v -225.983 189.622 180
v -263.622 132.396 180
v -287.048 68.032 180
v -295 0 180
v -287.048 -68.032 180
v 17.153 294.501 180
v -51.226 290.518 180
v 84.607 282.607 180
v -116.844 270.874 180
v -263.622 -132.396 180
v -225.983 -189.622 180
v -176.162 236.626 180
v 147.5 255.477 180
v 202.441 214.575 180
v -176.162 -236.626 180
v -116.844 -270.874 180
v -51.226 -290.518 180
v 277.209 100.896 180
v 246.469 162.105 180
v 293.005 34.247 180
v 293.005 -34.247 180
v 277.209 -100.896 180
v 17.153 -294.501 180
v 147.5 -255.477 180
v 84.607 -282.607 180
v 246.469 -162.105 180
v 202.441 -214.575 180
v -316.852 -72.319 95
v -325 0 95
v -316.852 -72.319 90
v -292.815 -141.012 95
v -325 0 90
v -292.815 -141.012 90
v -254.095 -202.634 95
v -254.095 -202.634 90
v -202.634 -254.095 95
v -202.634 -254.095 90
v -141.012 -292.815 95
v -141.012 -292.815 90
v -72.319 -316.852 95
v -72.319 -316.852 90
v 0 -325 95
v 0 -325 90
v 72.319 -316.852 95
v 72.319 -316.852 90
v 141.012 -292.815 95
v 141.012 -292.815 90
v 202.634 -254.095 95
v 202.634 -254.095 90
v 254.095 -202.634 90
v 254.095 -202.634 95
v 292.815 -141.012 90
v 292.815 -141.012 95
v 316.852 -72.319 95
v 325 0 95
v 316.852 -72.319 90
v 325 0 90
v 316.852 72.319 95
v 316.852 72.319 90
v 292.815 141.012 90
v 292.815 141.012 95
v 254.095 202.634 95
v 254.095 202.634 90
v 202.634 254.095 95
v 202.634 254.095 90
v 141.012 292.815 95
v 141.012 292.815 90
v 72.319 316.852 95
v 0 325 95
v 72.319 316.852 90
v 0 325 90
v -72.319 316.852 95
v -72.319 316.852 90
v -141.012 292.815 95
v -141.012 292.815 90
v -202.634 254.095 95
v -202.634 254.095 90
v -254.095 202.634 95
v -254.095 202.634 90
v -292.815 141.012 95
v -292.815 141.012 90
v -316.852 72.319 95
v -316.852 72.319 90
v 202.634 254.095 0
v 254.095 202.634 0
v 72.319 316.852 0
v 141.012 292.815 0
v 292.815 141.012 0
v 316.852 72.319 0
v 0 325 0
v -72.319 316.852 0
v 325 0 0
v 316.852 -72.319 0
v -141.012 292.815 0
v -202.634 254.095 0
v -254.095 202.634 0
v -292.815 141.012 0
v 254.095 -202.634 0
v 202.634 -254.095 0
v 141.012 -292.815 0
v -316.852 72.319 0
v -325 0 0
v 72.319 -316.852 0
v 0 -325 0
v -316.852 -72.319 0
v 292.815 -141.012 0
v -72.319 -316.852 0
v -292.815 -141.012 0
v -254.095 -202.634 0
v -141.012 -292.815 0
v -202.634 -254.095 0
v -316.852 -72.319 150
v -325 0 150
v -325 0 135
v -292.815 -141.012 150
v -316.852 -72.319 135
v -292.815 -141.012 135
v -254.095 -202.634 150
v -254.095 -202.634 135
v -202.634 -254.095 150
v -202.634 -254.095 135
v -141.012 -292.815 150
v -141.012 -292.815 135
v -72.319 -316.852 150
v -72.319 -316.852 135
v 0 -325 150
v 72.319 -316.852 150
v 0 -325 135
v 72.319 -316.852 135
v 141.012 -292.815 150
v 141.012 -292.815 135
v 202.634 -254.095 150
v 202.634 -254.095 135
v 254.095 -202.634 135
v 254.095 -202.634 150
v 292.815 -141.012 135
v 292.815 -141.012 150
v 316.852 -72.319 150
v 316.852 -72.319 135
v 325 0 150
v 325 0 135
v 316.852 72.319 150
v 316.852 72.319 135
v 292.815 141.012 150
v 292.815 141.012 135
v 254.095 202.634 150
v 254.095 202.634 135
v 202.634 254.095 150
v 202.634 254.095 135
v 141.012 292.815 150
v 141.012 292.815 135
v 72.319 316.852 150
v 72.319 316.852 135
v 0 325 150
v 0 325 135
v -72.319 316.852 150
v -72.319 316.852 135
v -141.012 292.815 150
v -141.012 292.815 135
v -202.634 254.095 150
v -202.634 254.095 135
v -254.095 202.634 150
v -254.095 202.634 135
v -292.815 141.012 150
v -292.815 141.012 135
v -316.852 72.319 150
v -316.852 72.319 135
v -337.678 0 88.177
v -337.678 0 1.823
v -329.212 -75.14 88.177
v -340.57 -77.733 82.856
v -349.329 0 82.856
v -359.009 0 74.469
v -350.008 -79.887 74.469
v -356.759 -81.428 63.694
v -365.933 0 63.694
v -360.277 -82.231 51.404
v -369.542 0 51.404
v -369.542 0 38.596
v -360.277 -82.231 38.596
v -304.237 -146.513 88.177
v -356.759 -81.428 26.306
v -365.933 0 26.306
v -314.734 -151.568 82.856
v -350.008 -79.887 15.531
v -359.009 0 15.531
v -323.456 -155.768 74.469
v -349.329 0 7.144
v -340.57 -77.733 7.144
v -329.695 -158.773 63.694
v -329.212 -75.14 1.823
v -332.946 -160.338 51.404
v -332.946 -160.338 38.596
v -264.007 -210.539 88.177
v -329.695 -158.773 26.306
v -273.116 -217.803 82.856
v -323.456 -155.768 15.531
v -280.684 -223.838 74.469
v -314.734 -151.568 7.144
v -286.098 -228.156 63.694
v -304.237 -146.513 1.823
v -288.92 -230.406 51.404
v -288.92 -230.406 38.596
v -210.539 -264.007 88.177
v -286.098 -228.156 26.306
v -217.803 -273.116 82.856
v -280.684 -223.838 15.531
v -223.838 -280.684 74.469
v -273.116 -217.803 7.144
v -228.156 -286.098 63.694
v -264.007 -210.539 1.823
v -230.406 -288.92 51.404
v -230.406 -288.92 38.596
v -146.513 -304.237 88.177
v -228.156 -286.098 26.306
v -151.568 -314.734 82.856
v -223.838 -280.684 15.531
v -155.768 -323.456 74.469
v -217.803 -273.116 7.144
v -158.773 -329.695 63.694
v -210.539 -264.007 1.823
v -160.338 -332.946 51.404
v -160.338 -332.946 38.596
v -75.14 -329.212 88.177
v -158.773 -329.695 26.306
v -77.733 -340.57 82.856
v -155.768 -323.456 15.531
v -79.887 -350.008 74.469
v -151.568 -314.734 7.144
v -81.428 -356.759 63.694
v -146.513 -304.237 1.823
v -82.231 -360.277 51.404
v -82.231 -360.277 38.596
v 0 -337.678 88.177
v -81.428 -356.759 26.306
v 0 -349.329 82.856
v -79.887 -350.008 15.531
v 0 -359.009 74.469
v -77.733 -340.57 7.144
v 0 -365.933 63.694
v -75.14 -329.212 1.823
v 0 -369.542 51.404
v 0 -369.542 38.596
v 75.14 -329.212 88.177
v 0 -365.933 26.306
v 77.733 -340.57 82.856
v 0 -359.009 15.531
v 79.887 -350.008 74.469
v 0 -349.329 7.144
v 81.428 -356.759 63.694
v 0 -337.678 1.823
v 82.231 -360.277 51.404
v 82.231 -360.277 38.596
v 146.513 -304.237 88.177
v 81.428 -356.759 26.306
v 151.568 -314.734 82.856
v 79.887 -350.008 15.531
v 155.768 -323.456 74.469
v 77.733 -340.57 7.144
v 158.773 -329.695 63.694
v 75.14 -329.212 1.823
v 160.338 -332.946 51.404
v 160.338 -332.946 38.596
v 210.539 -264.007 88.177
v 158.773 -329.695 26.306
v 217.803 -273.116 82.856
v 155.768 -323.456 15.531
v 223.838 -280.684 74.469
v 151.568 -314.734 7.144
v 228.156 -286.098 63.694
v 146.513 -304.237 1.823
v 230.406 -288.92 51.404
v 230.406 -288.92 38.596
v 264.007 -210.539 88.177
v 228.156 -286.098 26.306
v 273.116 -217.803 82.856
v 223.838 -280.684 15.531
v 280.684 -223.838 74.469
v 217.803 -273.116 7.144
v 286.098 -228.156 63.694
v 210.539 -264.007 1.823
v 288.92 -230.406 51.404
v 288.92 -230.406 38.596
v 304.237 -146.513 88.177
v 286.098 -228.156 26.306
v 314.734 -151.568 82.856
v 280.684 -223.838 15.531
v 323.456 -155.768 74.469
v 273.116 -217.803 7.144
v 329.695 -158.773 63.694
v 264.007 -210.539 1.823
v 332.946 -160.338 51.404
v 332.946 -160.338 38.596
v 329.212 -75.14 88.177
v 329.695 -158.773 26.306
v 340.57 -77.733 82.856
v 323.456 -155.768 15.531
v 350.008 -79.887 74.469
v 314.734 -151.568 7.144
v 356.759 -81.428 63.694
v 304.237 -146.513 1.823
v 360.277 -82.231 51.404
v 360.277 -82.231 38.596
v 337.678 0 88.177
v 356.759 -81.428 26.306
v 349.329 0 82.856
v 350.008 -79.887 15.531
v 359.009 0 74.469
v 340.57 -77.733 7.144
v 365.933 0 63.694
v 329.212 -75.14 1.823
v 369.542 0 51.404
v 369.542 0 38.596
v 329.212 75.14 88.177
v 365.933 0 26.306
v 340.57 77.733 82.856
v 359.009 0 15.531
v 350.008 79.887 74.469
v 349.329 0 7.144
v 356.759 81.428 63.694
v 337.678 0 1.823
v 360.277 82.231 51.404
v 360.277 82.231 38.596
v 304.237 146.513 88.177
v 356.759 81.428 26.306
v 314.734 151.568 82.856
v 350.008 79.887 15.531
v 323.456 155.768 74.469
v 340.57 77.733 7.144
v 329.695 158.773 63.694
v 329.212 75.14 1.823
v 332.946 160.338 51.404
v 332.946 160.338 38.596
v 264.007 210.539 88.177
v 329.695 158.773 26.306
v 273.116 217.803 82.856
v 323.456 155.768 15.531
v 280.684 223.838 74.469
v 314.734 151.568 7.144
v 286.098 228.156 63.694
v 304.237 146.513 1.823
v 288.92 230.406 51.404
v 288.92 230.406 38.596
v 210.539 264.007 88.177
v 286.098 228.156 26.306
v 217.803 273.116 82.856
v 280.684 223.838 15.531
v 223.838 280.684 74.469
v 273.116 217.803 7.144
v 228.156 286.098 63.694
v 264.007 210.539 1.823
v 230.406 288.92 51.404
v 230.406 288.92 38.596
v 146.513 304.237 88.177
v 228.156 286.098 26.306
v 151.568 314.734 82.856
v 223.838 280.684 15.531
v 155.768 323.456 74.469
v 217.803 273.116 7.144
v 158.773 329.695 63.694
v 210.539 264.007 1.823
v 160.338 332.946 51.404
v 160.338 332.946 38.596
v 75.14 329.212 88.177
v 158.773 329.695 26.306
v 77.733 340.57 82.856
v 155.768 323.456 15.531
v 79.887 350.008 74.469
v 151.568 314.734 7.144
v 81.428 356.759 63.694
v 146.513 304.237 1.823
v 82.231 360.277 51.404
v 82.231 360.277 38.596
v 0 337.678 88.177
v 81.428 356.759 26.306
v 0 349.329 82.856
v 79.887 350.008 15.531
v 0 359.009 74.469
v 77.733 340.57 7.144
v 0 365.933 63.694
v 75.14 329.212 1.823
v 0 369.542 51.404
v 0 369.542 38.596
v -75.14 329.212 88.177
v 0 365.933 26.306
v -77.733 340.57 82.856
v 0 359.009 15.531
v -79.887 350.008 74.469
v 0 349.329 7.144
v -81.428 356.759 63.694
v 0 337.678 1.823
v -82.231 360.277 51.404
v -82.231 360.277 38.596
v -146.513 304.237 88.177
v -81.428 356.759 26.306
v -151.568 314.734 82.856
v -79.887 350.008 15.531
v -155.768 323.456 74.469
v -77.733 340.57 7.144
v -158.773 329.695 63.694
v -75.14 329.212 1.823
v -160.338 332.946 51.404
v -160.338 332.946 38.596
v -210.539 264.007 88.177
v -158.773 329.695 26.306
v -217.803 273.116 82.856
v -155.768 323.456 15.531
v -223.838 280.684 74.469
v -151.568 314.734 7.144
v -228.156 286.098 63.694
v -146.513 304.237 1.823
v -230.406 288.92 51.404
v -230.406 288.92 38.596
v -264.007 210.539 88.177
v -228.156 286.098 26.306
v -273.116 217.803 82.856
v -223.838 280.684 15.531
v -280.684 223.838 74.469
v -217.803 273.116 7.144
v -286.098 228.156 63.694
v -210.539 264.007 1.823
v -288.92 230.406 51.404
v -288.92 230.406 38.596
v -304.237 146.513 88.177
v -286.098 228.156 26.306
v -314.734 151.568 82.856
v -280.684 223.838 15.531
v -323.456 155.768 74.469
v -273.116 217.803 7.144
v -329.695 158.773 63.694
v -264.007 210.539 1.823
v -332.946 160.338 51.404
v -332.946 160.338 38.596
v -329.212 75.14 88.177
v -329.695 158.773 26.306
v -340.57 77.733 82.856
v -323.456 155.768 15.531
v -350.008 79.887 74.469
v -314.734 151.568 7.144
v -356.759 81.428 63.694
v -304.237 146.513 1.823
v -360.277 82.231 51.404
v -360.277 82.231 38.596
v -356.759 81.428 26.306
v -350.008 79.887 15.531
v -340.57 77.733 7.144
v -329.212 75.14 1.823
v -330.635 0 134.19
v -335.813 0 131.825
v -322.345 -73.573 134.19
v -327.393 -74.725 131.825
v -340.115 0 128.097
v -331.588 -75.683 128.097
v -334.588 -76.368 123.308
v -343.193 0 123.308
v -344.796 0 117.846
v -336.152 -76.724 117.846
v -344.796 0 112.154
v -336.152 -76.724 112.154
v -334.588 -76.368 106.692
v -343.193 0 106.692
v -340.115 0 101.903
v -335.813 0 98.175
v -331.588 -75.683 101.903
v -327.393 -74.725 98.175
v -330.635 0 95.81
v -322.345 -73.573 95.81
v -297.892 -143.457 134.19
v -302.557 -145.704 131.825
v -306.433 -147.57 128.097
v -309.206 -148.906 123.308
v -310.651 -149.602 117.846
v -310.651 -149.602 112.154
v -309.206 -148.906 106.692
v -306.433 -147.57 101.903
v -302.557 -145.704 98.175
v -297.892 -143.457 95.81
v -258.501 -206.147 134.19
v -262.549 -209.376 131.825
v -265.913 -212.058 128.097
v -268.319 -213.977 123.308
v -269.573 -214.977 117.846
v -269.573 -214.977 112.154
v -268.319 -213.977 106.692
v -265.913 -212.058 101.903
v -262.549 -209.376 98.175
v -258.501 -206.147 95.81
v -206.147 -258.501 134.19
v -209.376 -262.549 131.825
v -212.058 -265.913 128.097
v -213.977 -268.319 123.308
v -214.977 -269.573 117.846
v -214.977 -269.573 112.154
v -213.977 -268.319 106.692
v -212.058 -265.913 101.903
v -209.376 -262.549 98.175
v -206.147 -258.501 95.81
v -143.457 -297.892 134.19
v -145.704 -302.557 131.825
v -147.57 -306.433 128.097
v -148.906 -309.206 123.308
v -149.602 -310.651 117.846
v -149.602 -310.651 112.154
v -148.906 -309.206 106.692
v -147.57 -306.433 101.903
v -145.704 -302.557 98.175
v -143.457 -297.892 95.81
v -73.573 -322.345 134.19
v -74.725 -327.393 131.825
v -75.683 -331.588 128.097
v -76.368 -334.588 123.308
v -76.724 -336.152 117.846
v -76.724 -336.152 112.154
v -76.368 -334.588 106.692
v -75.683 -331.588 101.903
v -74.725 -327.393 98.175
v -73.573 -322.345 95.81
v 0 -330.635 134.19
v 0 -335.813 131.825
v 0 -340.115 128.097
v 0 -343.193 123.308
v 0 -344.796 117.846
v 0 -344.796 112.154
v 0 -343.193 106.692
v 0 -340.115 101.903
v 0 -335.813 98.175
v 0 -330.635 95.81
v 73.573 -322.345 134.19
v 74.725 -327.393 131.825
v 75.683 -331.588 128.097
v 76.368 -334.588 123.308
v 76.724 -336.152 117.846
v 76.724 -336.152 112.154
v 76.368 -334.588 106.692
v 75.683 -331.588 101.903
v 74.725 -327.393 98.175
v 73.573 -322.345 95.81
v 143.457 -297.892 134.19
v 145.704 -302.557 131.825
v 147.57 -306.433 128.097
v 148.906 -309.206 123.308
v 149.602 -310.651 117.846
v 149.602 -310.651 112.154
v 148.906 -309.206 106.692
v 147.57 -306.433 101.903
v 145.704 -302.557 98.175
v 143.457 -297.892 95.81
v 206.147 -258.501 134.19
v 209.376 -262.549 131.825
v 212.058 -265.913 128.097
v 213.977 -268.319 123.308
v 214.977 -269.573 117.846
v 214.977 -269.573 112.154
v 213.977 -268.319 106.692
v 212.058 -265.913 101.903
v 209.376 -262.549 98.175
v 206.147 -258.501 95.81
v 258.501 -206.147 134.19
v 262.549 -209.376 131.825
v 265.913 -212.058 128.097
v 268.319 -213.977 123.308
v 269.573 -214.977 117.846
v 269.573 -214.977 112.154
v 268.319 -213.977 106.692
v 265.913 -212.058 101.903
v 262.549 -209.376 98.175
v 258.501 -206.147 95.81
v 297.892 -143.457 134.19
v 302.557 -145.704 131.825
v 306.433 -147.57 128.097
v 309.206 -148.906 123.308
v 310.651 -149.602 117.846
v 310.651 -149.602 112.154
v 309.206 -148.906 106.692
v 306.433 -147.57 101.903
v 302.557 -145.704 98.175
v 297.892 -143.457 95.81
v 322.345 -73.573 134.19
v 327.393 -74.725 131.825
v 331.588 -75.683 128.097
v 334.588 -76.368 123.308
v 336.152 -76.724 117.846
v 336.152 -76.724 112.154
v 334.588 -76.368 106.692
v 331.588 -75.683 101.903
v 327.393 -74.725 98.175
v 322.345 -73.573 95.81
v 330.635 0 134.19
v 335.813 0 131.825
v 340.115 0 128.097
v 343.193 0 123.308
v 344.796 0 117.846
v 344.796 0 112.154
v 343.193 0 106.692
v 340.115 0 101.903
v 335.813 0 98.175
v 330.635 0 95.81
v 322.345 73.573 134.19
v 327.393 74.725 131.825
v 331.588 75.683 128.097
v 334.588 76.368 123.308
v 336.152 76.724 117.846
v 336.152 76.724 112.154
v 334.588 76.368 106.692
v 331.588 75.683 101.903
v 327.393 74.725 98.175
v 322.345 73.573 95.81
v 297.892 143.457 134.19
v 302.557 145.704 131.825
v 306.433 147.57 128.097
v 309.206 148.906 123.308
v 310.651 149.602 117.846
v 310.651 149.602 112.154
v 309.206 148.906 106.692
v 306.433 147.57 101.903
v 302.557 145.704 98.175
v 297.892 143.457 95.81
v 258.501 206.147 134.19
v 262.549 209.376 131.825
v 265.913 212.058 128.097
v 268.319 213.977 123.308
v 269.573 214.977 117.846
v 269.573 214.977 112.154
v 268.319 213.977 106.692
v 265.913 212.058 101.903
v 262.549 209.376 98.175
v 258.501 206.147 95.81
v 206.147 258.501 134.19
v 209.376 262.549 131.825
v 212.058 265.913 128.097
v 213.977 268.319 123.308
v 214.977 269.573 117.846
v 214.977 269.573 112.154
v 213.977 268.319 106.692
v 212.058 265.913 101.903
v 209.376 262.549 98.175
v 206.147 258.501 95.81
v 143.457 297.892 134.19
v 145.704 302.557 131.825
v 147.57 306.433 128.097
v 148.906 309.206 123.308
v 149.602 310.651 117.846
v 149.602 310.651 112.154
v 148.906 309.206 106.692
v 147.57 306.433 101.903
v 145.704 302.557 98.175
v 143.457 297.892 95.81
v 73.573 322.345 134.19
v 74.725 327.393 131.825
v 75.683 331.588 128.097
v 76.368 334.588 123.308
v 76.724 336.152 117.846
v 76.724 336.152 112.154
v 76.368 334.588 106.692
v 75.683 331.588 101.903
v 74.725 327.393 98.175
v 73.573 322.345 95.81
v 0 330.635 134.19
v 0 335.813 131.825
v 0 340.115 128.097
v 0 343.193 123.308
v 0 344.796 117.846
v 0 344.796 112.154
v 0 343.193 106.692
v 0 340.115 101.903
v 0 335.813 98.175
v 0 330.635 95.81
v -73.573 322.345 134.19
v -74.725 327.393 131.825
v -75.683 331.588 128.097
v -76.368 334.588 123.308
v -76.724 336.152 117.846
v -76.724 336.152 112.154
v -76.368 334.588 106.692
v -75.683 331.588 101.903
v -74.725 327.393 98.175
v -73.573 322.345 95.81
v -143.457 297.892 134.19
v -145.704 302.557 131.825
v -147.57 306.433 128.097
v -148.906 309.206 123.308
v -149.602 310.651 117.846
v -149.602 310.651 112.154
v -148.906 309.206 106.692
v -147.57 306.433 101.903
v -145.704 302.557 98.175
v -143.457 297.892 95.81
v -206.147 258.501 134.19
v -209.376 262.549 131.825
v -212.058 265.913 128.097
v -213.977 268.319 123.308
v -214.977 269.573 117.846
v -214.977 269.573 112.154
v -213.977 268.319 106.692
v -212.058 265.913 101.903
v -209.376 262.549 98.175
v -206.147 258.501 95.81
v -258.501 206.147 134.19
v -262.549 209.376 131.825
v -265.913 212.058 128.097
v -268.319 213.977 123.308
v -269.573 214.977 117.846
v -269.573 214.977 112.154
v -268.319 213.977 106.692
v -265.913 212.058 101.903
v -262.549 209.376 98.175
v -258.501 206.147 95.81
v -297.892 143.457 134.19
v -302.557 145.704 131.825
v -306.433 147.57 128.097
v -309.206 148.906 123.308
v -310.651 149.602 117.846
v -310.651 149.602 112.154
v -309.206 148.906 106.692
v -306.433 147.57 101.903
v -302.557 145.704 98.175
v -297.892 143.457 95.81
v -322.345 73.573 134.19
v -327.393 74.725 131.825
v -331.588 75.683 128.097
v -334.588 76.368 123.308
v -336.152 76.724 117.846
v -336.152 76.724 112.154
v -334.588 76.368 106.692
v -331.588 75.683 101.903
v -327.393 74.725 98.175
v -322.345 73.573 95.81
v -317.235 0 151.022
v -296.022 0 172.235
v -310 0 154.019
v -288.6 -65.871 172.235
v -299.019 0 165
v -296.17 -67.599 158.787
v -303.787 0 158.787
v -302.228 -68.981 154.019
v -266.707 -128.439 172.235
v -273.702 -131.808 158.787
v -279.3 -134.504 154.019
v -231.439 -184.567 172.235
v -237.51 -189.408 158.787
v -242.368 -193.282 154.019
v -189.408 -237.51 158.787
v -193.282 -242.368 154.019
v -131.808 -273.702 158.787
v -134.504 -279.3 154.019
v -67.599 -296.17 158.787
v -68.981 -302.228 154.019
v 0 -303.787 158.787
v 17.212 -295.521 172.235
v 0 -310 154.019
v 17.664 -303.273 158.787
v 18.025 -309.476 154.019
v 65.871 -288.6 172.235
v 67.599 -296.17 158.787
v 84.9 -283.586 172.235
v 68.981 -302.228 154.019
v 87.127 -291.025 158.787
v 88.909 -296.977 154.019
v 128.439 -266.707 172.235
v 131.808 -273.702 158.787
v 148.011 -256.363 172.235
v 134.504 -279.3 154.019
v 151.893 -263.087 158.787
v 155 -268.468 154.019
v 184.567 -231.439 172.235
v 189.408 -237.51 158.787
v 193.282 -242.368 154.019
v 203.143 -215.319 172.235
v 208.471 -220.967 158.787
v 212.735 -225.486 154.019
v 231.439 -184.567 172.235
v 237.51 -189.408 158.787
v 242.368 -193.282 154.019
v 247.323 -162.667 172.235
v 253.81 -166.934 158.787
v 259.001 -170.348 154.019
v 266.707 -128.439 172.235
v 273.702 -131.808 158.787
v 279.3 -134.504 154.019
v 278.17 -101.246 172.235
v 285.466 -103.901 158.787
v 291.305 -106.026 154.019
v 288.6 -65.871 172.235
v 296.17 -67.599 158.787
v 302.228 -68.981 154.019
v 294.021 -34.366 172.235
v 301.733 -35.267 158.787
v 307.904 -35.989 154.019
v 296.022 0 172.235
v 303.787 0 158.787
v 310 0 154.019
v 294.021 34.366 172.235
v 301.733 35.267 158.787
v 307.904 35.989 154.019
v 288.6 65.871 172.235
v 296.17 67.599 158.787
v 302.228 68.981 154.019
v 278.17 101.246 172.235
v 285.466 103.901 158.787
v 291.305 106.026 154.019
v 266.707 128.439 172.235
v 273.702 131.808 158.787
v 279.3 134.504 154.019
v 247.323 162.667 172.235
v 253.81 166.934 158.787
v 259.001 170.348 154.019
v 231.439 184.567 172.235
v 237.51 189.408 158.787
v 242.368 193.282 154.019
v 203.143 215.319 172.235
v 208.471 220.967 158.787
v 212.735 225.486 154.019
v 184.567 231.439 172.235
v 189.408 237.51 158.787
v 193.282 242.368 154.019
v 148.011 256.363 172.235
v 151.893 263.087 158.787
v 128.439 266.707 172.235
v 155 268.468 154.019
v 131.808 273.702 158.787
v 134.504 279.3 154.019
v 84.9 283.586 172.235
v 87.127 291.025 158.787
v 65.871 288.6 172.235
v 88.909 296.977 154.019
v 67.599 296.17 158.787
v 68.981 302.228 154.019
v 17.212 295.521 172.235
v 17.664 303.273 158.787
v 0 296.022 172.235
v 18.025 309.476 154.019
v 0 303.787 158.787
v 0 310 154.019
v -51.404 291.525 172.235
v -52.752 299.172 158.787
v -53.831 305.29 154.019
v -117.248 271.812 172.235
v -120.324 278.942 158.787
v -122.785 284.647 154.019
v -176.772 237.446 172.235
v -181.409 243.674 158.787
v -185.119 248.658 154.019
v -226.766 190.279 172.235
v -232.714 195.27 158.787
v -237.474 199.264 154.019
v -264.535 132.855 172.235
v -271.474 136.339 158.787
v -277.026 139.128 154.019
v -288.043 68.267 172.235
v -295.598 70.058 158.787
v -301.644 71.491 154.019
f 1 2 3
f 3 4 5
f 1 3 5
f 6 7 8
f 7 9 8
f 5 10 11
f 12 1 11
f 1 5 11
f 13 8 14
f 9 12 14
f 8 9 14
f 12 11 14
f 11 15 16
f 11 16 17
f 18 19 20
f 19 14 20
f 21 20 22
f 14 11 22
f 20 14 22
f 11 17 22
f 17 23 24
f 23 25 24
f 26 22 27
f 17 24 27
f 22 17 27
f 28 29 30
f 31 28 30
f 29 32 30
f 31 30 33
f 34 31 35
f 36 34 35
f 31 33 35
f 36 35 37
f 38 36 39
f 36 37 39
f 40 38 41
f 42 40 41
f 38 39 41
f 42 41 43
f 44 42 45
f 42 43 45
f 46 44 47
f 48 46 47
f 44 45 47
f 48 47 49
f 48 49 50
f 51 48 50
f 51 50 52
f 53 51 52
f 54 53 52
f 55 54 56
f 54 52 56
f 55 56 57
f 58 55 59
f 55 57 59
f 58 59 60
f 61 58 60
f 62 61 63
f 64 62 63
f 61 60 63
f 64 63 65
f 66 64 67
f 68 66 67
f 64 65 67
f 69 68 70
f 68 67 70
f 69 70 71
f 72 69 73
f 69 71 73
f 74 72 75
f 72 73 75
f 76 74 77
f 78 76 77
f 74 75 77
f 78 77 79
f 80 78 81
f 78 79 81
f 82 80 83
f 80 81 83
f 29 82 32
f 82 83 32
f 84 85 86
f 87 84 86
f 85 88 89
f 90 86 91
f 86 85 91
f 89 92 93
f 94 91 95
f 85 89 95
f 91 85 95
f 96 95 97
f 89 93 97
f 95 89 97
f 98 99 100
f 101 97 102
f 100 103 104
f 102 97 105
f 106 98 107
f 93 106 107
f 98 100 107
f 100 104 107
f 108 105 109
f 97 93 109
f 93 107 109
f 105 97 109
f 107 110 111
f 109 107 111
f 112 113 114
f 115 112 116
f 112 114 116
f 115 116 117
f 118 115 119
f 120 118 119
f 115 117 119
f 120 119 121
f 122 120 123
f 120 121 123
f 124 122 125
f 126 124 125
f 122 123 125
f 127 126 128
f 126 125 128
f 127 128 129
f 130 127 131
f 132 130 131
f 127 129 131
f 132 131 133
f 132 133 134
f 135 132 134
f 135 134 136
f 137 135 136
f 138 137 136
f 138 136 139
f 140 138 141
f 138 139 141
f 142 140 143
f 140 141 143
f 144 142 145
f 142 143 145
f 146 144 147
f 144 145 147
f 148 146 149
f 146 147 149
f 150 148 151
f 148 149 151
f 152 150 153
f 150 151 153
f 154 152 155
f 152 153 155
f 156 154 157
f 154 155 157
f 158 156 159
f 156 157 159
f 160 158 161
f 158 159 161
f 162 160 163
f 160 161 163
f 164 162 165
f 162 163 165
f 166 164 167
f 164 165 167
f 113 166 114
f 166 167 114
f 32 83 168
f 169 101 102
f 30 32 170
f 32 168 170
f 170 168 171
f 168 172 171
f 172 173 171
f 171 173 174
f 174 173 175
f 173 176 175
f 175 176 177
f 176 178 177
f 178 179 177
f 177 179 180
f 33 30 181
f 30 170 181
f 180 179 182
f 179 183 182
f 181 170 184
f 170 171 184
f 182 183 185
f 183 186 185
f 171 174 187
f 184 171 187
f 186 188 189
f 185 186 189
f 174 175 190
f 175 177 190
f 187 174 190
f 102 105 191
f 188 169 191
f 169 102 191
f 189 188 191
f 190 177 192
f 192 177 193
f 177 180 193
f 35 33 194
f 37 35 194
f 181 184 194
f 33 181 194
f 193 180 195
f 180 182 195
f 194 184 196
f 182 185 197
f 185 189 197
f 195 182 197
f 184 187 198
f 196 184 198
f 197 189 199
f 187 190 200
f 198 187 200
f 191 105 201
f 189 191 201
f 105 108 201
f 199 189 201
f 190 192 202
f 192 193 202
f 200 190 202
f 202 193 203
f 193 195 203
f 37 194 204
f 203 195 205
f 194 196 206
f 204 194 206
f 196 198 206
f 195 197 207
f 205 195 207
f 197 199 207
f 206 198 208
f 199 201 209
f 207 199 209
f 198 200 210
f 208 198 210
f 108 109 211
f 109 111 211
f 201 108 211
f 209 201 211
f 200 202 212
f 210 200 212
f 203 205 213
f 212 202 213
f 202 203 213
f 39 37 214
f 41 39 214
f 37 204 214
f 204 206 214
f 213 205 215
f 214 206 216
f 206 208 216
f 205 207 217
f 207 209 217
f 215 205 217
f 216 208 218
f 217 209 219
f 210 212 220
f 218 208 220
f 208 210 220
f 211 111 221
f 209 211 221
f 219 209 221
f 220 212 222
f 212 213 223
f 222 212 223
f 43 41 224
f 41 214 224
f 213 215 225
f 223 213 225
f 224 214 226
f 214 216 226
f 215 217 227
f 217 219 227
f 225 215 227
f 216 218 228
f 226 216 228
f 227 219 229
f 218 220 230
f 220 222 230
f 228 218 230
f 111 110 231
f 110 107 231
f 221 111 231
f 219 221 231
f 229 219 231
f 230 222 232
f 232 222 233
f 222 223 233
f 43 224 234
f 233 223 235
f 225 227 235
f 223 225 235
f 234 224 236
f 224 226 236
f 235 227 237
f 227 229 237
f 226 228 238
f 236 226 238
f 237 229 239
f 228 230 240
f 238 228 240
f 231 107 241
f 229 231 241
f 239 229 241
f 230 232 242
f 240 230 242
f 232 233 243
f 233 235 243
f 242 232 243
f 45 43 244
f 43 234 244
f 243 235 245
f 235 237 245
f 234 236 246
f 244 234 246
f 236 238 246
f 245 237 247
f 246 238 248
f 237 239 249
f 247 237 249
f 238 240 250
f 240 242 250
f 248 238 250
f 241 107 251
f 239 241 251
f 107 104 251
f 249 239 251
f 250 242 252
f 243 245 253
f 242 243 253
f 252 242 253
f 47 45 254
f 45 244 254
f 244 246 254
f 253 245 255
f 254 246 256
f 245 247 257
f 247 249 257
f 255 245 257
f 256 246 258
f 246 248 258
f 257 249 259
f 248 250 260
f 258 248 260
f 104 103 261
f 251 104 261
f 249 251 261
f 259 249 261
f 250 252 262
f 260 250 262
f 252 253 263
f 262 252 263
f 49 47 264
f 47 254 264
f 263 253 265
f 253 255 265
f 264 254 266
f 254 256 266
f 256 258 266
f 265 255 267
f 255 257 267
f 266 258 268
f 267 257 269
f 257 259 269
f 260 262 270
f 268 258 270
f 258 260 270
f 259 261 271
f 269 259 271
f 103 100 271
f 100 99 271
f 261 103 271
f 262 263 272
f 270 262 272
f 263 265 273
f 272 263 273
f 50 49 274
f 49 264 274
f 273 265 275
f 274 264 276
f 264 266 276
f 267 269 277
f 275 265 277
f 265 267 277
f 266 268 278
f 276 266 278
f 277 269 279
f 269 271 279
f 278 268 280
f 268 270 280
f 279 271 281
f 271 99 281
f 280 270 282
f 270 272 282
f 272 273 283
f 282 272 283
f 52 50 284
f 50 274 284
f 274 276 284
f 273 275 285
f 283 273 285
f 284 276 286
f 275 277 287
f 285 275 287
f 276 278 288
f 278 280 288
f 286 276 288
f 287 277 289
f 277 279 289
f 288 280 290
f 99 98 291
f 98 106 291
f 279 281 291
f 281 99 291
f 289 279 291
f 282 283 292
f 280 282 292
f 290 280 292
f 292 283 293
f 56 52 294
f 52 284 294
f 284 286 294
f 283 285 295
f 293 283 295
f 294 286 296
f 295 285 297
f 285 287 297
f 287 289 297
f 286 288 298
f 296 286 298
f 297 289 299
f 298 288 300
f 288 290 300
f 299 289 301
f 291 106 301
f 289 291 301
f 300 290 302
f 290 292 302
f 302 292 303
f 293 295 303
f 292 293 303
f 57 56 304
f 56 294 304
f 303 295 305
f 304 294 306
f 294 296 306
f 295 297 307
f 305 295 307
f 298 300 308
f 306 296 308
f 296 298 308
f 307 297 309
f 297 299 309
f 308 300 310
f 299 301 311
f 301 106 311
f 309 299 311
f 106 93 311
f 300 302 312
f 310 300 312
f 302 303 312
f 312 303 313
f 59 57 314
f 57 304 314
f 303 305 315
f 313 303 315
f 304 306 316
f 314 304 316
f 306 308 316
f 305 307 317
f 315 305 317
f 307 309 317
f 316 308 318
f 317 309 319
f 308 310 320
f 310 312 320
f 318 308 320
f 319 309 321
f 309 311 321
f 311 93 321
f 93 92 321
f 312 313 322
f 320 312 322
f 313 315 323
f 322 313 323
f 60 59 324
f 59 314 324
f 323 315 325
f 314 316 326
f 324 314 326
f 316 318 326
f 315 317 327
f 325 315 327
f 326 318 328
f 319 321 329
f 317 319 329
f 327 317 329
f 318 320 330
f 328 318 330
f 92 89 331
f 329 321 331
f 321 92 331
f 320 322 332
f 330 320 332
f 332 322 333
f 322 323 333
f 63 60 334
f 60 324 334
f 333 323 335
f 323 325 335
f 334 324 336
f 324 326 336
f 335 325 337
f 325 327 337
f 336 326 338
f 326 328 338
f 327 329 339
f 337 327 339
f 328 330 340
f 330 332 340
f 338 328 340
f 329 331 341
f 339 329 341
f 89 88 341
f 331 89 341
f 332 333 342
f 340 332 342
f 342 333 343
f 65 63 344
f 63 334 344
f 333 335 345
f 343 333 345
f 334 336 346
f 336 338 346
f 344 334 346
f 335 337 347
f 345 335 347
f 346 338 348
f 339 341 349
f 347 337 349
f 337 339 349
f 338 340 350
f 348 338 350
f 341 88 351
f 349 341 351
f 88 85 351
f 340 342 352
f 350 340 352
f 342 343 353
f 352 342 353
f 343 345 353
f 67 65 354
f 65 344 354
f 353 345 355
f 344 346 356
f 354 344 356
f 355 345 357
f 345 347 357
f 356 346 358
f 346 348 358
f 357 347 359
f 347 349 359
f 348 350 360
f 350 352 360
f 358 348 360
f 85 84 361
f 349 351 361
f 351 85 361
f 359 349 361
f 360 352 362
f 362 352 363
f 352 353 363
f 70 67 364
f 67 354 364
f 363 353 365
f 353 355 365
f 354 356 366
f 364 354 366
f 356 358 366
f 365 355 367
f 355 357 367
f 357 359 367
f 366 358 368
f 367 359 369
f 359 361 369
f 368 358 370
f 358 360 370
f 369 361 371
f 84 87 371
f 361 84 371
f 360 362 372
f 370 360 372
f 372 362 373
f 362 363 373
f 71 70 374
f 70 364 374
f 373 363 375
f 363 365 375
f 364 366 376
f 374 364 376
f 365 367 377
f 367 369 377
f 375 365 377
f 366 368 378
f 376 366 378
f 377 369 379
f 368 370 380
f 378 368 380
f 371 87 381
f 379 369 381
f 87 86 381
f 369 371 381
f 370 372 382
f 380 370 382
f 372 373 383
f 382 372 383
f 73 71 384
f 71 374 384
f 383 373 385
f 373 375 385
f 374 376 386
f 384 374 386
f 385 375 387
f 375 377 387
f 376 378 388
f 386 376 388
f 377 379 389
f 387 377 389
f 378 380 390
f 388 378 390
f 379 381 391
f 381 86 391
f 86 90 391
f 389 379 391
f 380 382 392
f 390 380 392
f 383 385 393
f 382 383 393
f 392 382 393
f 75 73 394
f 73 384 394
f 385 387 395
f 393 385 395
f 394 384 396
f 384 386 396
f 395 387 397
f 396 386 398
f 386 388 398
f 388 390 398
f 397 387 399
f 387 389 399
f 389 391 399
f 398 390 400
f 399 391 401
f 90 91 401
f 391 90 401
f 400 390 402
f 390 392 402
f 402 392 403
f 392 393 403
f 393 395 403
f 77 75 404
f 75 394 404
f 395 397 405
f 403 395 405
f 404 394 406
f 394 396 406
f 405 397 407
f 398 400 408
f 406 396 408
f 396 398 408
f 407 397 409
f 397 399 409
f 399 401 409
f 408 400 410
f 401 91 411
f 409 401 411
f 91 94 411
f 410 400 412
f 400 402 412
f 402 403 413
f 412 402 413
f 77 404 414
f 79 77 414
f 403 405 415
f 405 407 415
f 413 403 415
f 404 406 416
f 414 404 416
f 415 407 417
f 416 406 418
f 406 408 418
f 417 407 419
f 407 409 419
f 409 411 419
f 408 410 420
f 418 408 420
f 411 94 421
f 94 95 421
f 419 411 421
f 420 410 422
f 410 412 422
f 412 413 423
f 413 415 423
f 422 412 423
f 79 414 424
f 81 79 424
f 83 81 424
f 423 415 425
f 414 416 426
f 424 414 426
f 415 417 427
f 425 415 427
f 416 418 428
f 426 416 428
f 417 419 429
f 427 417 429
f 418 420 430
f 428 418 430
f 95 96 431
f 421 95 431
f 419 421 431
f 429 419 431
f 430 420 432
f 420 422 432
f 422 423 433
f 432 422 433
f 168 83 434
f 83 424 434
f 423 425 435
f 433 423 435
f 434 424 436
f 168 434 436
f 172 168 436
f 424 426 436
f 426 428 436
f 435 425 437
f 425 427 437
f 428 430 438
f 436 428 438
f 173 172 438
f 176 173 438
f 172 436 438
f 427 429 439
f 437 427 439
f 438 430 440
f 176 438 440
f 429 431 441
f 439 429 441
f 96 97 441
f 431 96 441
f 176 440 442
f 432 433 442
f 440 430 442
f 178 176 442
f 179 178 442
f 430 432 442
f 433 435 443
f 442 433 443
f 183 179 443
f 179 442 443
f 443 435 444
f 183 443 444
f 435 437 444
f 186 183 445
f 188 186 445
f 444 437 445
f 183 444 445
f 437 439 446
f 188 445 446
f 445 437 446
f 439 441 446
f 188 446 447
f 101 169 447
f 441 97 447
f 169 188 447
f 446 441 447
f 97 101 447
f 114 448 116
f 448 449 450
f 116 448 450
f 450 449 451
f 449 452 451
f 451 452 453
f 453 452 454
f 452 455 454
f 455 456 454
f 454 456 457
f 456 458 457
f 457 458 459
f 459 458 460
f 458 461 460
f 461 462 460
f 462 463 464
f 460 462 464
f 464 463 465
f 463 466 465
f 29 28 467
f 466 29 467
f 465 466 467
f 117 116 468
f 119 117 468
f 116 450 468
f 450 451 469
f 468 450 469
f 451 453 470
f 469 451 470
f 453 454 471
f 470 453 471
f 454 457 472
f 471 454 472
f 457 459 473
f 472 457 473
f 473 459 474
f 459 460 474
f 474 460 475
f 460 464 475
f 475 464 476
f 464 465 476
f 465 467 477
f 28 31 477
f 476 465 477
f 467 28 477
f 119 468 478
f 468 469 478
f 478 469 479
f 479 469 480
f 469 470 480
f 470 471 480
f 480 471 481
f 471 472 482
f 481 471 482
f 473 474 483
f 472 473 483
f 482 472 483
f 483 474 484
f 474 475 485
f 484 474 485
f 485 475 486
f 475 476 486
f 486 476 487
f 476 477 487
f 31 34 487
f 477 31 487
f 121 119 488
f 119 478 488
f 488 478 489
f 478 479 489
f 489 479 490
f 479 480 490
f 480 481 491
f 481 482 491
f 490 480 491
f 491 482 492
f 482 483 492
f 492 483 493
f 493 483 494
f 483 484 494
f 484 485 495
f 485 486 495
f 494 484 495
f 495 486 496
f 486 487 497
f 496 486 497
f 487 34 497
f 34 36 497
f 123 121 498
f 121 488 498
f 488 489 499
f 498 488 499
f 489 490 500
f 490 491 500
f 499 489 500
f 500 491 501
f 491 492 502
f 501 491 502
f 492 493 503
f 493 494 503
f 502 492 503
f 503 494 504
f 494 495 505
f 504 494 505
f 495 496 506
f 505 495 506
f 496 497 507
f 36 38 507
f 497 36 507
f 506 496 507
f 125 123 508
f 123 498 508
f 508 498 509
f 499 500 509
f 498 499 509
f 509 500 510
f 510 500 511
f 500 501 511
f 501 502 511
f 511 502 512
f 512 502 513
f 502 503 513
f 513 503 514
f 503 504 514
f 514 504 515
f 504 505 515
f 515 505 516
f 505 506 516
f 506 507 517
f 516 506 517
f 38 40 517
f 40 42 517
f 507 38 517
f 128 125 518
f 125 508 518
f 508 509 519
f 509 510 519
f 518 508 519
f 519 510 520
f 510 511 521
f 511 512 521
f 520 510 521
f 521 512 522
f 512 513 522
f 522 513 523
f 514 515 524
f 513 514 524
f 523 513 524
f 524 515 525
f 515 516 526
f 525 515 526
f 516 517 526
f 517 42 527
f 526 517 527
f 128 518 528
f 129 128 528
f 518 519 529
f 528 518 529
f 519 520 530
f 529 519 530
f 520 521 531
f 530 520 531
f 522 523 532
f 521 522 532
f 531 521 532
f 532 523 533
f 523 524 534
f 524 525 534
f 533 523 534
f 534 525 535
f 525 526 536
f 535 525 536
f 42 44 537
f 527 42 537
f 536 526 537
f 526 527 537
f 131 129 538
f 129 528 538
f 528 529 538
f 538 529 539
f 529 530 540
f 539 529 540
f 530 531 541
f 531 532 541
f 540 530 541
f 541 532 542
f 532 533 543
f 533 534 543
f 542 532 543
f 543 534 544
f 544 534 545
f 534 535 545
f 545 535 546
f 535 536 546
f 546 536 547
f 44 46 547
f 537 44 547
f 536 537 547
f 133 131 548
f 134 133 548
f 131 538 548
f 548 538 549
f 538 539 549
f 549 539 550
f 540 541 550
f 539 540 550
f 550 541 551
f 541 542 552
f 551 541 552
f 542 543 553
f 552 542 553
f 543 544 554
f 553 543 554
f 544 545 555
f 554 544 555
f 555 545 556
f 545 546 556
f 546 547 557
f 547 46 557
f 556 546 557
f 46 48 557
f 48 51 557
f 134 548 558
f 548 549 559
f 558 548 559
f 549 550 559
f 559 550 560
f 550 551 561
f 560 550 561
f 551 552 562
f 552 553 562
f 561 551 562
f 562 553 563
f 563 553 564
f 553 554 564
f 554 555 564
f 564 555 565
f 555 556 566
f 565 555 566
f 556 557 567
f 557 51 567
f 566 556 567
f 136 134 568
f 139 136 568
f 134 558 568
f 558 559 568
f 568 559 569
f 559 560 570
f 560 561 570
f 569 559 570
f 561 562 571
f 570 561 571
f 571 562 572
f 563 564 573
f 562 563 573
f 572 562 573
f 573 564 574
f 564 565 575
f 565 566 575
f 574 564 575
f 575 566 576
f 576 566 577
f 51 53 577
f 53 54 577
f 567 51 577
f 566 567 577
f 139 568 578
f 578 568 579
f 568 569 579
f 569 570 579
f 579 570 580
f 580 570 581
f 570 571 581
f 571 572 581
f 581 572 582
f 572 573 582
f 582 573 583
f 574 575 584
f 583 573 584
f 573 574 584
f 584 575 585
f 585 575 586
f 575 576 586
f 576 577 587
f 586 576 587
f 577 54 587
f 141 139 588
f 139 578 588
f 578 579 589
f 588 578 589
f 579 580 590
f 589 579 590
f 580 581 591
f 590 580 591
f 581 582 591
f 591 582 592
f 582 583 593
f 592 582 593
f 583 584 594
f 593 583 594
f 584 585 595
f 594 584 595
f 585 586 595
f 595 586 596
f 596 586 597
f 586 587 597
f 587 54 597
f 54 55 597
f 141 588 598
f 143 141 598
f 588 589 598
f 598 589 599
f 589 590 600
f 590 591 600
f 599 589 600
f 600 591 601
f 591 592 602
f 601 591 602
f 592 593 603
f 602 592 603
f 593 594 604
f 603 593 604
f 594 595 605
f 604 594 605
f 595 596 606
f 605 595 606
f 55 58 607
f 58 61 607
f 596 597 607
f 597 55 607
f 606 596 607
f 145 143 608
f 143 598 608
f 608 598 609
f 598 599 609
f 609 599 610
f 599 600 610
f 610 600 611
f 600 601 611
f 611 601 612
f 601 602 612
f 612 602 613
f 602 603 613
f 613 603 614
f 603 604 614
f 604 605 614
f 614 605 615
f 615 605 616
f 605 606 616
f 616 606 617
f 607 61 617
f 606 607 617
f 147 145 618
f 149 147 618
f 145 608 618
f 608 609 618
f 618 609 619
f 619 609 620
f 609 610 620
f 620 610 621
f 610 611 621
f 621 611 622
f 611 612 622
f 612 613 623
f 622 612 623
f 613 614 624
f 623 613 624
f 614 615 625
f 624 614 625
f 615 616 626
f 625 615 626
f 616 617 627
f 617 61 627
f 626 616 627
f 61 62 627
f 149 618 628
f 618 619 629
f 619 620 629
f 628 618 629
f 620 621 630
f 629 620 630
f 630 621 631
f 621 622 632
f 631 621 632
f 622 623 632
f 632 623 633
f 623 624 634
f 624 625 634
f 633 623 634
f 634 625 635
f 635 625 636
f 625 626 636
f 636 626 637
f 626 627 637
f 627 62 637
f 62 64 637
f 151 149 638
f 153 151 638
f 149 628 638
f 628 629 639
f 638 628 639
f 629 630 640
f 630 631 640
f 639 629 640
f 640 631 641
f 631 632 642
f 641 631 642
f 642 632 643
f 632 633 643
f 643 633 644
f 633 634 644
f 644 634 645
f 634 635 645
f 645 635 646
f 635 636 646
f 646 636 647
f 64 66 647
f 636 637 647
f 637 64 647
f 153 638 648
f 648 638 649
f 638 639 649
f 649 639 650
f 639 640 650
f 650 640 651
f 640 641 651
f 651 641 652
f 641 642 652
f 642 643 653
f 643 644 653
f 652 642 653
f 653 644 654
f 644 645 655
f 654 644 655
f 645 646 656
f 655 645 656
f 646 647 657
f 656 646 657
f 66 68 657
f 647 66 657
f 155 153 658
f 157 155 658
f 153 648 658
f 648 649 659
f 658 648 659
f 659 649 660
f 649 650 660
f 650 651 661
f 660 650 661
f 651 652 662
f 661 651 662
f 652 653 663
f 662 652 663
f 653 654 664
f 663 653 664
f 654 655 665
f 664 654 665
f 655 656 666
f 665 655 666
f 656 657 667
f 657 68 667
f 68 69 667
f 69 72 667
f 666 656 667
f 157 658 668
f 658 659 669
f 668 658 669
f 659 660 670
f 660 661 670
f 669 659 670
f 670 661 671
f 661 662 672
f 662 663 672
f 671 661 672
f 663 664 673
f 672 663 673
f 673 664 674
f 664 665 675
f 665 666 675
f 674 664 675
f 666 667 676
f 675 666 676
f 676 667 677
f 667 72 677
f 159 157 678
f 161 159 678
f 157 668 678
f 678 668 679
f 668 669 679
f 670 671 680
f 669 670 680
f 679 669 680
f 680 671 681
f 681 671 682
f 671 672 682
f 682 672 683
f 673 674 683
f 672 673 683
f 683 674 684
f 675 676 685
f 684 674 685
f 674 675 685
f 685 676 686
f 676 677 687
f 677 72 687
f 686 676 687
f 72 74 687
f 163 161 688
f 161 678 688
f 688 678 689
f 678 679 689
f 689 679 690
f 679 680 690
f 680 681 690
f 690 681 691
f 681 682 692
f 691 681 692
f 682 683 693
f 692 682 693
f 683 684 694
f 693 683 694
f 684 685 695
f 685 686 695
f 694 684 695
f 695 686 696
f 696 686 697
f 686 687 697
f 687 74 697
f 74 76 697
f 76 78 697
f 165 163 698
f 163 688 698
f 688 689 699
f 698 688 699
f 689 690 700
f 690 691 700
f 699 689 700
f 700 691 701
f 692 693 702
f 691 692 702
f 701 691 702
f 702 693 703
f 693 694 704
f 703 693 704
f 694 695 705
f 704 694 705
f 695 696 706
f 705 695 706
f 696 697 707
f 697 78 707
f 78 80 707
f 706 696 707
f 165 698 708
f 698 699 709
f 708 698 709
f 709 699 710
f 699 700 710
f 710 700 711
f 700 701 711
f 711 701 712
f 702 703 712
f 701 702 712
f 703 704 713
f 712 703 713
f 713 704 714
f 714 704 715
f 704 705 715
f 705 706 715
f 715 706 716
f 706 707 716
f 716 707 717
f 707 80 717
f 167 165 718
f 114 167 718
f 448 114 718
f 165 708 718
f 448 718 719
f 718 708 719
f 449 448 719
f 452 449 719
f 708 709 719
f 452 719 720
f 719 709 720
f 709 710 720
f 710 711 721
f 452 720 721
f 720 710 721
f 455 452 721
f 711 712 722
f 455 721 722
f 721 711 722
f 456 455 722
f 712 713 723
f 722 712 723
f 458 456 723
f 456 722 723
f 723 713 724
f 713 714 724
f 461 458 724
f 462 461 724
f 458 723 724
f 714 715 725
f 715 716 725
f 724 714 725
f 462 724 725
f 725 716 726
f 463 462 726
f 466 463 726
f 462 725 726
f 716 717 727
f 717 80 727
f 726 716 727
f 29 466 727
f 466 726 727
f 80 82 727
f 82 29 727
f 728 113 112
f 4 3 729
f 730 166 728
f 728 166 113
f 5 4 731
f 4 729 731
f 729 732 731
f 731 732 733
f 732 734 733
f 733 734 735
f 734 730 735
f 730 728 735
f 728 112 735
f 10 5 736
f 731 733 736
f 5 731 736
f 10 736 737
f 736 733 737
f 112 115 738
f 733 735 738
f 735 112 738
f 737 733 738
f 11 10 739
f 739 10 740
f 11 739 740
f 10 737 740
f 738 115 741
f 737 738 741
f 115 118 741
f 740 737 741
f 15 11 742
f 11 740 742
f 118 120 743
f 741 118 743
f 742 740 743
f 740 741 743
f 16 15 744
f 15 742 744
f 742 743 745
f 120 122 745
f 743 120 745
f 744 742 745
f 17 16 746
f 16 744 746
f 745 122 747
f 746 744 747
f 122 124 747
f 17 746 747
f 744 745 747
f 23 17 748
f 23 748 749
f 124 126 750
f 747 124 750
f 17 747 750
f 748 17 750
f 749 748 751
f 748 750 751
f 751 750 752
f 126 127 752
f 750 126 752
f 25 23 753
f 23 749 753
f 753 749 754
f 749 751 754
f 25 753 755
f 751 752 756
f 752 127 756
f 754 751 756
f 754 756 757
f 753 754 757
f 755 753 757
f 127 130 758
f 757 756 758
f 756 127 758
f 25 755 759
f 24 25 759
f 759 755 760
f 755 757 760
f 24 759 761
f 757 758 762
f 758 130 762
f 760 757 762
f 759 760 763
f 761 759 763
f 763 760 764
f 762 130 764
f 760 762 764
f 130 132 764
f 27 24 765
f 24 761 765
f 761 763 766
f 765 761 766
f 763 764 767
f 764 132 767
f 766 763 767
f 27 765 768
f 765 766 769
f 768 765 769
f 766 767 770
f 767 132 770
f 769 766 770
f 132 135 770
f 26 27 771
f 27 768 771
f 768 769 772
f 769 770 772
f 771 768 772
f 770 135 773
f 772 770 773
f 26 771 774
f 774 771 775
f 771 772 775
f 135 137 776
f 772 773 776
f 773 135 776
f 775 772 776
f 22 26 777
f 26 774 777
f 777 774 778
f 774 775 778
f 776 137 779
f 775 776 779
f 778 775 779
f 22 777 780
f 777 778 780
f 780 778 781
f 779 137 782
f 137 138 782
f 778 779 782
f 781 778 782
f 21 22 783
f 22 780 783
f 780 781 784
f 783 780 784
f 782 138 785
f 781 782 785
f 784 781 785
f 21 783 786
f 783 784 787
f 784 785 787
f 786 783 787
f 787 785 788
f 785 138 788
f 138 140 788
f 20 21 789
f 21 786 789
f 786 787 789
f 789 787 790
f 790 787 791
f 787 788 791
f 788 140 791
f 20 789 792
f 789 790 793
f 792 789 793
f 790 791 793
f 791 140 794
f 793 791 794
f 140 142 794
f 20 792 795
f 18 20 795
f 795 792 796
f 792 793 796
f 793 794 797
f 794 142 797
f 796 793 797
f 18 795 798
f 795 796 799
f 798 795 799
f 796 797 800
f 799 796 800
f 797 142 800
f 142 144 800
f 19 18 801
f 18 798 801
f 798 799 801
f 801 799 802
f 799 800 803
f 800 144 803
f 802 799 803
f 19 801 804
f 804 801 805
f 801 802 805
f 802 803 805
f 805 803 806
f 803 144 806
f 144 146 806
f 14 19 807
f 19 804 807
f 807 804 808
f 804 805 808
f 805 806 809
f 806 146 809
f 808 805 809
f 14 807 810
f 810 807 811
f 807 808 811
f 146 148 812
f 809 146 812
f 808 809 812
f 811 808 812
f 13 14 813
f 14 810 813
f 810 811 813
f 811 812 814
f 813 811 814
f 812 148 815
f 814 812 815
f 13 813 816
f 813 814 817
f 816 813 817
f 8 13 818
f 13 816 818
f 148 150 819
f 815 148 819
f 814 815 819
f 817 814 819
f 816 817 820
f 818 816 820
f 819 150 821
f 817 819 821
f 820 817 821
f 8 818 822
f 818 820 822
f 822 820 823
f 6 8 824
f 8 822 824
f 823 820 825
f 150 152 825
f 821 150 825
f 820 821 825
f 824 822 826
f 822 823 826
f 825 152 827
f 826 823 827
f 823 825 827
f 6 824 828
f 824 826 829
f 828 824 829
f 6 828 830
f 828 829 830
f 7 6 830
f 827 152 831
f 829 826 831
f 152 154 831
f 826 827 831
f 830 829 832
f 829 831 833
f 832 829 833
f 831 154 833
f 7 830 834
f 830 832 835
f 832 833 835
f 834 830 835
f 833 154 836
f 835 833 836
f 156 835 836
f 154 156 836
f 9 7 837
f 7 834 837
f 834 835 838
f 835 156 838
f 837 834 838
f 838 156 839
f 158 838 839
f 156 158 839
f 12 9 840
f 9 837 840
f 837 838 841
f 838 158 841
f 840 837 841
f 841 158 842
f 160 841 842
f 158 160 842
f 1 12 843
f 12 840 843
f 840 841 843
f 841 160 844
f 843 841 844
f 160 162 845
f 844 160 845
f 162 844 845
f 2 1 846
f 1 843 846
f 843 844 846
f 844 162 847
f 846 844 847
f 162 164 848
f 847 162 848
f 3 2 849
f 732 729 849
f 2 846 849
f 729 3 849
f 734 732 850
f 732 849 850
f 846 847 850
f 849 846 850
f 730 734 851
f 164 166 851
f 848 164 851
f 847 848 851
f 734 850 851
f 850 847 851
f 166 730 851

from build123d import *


with BuildPart() as f1:
    # F0 (on Front) → F1 (revolve)
    with BuildSketch(Plane.XZ):
        with BuildLine():
            Line((-325, 0), (0, 0))
            Line((0, 0), (0, 180))
            Line((0, 180), (-295, 180))
            ThreePointArc((-295, 180), (-303.786797, 158.786797), (-325, 150))
            Line((-325, 150), (-325, 135))
            ThreePointArc((-325, 135), (-345, 115), (-325, 95))
            Line((-325, 95), (-325, 90))
            ThreePointArc((-325, 90), (-370, 45), (-325, 0))
        make_face()
    revolve(axis=Axis((0, 0, 90), (0, 0, 1)))


solid = f1.part
